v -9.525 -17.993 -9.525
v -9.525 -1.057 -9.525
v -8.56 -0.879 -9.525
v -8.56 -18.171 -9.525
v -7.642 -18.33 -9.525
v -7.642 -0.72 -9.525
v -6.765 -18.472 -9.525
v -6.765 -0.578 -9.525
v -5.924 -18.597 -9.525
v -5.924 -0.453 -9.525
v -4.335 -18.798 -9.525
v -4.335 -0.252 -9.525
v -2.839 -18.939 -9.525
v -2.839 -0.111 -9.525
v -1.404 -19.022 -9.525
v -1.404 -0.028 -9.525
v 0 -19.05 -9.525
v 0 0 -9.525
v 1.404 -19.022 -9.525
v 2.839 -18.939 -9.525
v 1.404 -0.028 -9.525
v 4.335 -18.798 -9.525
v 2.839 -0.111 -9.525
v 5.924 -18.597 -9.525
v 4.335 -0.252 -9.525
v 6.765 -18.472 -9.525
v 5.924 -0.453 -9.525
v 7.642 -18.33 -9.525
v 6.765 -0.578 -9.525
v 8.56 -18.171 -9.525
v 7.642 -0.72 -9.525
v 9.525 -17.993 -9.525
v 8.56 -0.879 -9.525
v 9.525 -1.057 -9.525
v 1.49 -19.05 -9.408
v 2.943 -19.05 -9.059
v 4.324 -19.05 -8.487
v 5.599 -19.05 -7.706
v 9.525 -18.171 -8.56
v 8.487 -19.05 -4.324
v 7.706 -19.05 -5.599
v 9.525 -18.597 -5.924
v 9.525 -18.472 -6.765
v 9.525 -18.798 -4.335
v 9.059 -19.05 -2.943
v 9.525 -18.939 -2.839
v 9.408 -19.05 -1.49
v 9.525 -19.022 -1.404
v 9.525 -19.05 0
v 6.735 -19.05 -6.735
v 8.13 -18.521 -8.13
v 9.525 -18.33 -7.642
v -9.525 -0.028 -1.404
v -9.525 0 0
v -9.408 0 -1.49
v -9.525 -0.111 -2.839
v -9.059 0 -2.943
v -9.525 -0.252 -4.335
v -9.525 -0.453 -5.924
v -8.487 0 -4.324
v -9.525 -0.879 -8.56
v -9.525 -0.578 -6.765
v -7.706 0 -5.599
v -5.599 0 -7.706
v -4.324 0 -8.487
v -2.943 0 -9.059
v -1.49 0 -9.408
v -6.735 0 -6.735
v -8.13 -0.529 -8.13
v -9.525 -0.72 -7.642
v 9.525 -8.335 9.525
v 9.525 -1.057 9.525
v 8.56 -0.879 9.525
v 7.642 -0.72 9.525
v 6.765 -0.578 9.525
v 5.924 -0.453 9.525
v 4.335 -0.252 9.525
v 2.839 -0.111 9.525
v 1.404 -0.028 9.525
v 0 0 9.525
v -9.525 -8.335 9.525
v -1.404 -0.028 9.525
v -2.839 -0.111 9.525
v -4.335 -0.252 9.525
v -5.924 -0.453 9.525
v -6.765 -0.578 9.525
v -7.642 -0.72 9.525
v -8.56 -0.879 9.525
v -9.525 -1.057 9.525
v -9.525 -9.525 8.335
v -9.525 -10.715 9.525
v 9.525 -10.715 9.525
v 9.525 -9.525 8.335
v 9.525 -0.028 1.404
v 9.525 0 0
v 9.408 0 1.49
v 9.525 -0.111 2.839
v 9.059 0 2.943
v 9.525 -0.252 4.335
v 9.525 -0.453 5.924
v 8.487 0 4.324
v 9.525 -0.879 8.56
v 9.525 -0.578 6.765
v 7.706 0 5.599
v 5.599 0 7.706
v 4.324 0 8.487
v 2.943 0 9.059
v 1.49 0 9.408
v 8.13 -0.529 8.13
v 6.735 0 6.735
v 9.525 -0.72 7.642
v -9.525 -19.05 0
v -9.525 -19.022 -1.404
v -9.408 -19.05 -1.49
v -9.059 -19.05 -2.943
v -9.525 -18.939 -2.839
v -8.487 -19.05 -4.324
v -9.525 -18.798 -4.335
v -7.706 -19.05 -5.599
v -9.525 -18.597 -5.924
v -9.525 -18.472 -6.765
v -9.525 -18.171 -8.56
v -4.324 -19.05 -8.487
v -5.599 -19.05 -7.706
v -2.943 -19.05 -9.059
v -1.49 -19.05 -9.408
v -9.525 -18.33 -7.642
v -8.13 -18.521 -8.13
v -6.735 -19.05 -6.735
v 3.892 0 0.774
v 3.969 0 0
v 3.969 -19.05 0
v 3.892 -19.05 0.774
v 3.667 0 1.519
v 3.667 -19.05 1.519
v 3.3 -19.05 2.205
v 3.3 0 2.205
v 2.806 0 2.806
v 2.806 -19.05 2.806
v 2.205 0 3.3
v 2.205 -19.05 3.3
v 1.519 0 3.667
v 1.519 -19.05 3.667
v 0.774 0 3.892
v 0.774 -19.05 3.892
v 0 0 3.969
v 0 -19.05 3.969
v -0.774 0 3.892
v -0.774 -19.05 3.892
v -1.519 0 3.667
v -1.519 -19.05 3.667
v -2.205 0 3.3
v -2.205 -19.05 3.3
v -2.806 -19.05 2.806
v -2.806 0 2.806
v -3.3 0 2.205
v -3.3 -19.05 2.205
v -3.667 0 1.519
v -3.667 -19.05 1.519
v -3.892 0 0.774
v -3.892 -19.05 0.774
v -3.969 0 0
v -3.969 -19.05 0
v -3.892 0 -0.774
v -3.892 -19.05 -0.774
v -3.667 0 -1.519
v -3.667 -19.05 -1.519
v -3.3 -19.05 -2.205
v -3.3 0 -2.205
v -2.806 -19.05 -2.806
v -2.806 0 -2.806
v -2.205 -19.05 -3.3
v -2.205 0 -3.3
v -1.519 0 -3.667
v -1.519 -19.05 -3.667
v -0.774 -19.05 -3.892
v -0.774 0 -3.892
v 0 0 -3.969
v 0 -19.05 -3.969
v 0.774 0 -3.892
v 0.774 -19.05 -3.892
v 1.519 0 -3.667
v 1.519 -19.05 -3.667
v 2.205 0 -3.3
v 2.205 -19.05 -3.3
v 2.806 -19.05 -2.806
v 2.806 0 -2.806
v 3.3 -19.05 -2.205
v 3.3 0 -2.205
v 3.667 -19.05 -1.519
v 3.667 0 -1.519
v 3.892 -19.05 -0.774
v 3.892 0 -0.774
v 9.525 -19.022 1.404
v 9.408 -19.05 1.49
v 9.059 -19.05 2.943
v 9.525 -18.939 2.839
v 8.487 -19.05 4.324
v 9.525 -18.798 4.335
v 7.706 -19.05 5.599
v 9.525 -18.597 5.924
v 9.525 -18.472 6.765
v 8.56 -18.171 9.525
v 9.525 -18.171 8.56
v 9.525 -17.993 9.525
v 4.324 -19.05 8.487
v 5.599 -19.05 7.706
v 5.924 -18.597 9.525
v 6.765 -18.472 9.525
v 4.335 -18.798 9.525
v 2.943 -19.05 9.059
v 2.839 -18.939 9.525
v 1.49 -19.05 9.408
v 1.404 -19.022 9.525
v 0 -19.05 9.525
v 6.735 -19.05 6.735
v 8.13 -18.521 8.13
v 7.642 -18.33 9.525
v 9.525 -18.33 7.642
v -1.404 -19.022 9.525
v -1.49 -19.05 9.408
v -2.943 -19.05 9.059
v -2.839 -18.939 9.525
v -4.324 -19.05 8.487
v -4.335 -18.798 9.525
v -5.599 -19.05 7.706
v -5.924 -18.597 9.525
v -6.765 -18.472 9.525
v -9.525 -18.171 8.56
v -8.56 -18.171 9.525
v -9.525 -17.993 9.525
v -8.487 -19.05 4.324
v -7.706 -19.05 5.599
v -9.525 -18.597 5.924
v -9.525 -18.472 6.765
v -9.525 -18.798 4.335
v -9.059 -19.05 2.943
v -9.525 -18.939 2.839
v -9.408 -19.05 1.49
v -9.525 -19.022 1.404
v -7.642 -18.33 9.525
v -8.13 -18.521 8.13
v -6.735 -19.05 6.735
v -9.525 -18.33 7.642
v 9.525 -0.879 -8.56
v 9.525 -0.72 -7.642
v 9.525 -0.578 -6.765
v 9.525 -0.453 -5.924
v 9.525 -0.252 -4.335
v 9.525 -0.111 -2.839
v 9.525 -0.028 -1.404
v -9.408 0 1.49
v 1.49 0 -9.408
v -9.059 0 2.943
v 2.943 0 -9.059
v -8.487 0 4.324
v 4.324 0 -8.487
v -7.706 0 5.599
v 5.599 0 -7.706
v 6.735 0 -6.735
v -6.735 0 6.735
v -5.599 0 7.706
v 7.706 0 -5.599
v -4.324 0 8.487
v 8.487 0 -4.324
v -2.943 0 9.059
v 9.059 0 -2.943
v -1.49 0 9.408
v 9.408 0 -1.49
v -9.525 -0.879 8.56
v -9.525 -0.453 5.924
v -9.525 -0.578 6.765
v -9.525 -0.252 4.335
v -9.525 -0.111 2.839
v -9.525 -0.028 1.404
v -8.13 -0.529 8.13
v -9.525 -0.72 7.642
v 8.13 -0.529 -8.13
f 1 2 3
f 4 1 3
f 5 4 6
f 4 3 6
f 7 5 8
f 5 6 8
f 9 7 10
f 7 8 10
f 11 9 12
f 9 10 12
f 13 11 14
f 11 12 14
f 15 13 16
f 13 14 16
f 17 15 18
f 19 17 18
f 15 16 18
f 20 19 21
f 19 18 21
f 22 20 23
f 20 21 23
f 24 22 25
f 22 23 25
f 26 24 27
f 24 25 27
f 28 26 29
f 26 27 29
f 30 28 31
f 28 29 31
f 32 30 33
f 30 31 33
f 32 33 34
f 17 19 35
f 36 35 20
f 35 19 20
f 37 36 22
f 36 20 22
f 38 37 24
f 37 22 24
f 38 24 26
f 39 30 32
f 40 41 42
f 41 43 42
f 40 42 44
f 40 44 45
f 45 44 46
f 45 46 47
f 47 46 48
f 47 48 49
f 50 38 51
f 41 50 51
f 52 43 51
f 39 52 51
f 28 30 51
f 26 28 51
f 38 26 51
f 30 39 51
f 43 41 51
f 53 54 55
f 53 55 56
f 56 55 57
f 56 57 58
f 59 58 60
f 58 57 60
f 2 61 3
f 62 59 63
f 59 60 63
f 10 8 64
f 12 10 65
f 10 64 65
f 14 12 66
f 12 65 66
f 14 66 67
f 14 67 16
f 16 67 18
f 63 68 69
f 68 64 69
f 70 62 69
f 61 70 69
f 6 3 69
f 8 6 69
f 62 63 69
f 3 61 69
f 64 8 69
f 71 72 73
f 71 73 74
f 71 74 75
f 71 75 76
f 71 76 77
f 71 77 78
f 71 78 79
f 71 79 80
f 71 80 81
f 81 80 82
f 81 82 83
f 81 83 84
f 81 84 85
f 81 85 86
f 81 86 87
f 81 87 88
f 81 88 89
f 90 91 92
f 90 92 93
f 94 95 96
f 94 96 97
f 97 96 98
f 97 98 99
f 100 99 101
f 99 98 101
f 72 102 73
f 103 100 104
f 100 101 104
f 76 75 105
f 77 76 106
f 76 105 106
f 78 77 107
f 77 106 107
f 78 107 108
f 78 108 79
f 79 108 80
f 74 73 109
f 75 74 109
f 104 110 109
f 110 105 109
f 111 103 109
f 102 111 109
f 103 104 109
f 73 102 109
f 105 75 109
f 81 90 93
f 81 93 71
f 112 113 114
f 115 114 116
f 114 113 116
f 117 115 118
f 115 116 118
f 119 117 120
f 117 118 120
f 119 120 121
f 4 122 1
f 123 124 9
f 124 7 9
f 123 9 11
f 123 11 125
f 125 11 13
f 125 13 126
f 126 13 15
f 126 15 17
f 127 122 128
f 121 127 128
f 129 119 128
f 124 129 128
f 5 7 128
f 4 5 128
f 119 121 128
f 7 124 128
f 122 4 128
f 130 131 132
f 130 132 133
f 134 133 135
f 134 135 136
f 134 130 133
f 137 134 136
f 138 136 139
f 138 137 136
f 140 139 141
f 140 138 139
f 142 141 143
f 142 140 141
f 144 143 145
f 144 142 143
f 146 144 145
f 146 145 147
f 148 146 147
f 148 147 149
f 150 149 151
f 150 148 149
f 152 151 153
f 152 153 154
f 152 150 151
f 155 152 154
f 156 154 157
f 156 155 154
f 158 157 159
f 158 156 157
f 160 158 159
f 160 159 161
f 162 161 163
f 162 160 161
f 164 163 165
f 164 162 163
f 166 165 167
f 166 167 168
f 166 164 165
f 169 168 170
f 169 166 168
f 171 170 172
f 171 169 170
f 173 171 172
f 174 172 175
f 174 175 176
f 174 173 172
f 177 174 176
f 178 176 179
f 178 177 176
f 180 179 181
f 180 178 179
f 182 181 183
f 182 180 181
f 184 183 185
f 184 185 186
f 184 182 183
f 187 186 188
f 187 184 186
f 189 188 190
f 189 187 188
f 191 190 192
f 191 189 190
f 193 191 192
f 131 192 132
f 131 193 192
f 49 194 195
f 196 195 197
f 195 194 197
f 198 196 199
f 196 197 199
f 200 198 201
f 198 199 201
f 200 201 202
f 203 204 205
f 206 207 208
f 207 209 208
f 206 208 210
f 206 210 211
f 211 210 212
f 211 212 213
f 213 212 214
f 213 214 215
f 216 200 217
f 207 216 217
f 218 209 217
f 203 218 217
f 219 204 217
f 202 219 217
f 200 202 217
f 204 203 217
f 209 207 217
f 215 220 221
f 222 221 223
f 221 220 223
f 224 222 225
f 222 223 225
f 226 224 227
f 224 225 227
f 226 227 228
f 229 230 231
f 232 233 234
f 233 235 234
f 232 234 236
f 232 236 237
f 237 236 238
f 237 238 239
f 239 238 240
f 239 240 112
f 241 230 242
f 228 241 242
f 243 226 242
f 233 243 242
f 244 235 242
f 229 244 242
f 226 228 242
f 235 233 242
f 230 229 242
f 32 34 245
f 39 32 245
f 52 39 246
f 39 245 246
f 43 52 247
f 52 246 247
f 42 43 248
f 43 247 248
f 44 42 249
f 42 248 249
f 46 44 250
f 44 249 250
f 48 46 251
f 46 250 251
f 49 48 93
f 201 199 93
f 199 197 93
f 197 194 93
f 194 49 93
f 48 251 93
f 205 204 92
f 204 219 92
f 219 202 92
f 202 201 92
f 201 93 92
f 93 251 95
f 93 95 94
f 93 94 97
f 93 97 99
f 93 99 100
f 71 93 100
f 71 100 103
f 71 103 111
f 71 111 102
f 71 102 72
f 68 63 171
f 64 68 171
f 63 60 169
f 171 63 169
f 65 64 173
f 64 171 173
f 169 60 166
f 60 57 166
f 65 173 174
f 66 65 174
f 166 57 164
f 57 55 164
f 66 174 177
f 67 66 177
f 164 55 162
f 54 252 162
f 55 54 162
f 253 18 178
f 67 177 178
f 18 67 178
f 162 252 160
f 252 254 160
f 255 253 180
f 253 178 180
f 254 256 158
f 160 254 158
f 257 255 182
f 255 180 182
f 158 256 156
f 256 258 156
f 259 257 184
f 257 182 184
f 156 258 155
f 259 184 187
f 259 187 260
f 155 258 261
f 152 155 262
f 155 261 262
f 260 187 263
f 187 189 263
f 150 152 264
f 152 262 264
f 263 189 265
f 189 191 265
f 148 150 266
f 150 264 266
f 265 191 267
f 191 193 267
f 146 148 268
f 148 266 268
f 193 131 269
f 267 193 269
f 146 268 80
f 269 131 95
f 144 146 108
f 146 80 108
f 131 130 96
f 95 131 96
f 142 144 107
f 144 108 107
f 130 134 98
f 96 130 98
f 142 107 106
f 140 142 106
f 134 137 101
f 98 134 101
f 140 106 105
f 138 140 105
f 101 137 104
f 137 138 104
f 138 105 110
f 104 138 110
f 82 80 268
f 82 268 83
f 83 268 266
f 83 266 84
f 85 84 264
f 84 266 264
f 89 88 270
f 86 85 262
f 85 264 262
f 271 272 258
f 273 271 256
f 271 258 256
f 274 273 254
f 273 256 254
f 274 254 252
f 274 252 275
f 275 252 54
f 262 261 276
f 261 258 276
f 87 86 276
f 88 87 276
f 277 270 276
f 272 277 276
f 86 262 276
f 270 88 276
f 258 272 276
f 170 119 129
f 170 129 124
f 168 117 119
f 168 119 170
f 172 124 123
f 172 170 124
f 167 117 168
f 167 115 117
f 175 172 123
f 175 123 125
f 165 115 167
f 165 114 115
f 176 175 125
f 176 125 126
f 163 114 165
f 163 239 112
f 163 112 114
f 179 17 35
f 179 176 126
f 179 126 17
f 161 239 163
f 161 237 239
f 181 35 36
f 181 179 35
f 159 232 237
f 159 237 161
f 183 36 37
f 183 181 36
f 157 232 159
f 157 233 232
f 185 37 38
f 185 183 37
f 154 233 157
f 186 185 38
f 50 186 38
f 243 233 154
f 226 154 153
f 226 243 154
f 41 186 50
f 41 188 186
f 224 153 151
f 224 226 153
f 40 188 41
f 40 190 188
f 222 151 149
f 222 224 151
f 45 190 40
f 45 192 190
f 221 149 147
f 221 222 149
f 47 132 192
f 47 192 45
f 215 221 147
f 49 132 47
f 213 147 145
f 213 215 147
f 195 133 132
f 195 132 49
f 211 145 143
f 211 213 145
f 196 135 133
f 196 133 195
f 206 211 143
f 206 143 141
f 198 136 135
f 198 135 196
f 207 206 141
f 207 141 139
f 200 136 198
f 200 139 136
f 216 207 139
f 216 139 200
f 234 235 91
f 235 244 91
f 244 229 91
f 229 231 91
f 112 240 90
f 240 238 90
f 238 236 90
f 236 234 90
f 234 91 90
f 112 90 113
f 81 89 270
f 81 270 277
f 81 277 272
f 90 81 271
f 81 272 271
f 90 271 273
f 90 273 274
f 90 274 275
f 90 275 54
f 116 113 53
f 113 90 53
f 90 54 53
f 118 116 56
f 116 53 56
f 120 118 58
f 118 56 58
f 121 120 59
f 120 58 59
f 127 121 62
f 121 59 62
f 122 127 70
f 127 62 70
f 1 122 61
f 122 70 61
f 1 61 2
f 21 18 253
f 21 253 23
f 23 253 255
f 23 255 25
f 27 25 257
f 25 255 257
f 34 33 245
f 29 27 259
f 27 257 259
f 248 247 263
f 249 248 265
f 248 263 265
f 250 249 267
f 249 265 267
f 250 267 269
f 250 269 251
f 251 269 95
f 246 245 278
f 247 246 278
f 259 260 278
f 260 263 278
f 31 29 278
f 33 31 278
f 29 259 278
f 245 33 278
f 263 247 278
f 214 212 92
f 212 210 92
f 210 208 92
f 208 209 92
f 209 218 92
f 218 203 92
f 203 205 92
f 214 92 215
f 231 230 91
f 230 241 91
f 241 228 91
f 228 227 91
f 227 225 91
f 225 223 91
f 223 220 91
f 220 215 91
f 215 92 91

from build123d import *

# Parameters (mm, degrees)
F0_R     = 3.96875
F1_DEPTH = 19.05
F3_DEPTH = 127


with BuildPart() as f1:
    # F0 (on Front) → F1 (new body)
    with BuildSketch(Plane.XZ):
        with BuildLine():
            ThreePointArc((0, -9.525), (6.7351920908, -6.7351920908), (9.525, 0))
            ThreePointArc((9.525, 0), (6.7351920908, 6.7351920908), (0, 9.525))
            ThreePointArc((0, 9.525), (-6.7351920908, 6.7351920908), (-9.525, 0))
            ThreePointArc((-9.525, 0), (-6.7351920908, -6.7351920908), (0, -9.525))
        make_face()
        Circle(F0_R, mode=Mode.SUBTRACT)
        with BuildLine():
            Line((9.525, -9.525), (9.525, 0))
            ThreePointArc((9.525, 0), (6.7351920908, -6.7351920908), (0, -9.525))
            Line((0, -9.525), (9.525, -9.525))
        make_face()
        with BuildLine():
            ThreePointArc((0, 9.525), (6.7351920908, 6.7351920908), (9.525, 0))
            Line((9.525, 0), (9.525, 9.525))
            Line((9.525, 9.525), (0, 9.525))
        make_face()
        with BuildLine():
            ThreePointArc((-9.525, 0), (-6.7351920908, 6.7351920908), (0, 9.525))
            Line((0, 9.525), (-9.525, 9.525))
            Line((-9.525, 9.525), (-9.525, 0))
        make_face()
        with BuildLine():
            Line((-9.525, -9.525), (0, -9.525))
            ThreePointArc((0, -9.525), (-6.7351920908, -6.7351920908), (-9.525, 0))
            Line((-9.525, 0), (-9.525, -9.525))
        make_face()
    extrude(amount=F1_DEPTH)

    # F2 (on face) → F3 (cut)
    with BuildSketch(Plane.YZ.offset(9.525)):
        Polygon((-14.3871692356, 13.1968459708), (-9.525, 8.3346767351), (-4.6628307644, 13.1968459708), align=None)
    extrude(amount=-F3_DEPTH, mode=Mode.SUBTRACT)

    # F4 (on Right) → F5 (revolve, cut)
    with BuildSketch(Plane.YZ):
        Polygon((-19.05, 15.1654964413), (-19.05, 9.525), (-17.5386335336, 15.1654964413), align=None)
    revolve(axis=Axis((0, -19.05, 0), (0, -1, 0)), mode=Mode.SUBTRACT)

    # F6 (on Right) → F7 (revolve, cut)
    with BuildSketch(Plane.YZ):
        Polygon((-1.3839481467, 14.6899647984), (0, 9.525), (0, 14.6899647984), align=None)
    revolve(axis=Axis((0, 0, 0), (0, -1, 0)), mode=Mode.SUBTRACT)


solid = f1.part
